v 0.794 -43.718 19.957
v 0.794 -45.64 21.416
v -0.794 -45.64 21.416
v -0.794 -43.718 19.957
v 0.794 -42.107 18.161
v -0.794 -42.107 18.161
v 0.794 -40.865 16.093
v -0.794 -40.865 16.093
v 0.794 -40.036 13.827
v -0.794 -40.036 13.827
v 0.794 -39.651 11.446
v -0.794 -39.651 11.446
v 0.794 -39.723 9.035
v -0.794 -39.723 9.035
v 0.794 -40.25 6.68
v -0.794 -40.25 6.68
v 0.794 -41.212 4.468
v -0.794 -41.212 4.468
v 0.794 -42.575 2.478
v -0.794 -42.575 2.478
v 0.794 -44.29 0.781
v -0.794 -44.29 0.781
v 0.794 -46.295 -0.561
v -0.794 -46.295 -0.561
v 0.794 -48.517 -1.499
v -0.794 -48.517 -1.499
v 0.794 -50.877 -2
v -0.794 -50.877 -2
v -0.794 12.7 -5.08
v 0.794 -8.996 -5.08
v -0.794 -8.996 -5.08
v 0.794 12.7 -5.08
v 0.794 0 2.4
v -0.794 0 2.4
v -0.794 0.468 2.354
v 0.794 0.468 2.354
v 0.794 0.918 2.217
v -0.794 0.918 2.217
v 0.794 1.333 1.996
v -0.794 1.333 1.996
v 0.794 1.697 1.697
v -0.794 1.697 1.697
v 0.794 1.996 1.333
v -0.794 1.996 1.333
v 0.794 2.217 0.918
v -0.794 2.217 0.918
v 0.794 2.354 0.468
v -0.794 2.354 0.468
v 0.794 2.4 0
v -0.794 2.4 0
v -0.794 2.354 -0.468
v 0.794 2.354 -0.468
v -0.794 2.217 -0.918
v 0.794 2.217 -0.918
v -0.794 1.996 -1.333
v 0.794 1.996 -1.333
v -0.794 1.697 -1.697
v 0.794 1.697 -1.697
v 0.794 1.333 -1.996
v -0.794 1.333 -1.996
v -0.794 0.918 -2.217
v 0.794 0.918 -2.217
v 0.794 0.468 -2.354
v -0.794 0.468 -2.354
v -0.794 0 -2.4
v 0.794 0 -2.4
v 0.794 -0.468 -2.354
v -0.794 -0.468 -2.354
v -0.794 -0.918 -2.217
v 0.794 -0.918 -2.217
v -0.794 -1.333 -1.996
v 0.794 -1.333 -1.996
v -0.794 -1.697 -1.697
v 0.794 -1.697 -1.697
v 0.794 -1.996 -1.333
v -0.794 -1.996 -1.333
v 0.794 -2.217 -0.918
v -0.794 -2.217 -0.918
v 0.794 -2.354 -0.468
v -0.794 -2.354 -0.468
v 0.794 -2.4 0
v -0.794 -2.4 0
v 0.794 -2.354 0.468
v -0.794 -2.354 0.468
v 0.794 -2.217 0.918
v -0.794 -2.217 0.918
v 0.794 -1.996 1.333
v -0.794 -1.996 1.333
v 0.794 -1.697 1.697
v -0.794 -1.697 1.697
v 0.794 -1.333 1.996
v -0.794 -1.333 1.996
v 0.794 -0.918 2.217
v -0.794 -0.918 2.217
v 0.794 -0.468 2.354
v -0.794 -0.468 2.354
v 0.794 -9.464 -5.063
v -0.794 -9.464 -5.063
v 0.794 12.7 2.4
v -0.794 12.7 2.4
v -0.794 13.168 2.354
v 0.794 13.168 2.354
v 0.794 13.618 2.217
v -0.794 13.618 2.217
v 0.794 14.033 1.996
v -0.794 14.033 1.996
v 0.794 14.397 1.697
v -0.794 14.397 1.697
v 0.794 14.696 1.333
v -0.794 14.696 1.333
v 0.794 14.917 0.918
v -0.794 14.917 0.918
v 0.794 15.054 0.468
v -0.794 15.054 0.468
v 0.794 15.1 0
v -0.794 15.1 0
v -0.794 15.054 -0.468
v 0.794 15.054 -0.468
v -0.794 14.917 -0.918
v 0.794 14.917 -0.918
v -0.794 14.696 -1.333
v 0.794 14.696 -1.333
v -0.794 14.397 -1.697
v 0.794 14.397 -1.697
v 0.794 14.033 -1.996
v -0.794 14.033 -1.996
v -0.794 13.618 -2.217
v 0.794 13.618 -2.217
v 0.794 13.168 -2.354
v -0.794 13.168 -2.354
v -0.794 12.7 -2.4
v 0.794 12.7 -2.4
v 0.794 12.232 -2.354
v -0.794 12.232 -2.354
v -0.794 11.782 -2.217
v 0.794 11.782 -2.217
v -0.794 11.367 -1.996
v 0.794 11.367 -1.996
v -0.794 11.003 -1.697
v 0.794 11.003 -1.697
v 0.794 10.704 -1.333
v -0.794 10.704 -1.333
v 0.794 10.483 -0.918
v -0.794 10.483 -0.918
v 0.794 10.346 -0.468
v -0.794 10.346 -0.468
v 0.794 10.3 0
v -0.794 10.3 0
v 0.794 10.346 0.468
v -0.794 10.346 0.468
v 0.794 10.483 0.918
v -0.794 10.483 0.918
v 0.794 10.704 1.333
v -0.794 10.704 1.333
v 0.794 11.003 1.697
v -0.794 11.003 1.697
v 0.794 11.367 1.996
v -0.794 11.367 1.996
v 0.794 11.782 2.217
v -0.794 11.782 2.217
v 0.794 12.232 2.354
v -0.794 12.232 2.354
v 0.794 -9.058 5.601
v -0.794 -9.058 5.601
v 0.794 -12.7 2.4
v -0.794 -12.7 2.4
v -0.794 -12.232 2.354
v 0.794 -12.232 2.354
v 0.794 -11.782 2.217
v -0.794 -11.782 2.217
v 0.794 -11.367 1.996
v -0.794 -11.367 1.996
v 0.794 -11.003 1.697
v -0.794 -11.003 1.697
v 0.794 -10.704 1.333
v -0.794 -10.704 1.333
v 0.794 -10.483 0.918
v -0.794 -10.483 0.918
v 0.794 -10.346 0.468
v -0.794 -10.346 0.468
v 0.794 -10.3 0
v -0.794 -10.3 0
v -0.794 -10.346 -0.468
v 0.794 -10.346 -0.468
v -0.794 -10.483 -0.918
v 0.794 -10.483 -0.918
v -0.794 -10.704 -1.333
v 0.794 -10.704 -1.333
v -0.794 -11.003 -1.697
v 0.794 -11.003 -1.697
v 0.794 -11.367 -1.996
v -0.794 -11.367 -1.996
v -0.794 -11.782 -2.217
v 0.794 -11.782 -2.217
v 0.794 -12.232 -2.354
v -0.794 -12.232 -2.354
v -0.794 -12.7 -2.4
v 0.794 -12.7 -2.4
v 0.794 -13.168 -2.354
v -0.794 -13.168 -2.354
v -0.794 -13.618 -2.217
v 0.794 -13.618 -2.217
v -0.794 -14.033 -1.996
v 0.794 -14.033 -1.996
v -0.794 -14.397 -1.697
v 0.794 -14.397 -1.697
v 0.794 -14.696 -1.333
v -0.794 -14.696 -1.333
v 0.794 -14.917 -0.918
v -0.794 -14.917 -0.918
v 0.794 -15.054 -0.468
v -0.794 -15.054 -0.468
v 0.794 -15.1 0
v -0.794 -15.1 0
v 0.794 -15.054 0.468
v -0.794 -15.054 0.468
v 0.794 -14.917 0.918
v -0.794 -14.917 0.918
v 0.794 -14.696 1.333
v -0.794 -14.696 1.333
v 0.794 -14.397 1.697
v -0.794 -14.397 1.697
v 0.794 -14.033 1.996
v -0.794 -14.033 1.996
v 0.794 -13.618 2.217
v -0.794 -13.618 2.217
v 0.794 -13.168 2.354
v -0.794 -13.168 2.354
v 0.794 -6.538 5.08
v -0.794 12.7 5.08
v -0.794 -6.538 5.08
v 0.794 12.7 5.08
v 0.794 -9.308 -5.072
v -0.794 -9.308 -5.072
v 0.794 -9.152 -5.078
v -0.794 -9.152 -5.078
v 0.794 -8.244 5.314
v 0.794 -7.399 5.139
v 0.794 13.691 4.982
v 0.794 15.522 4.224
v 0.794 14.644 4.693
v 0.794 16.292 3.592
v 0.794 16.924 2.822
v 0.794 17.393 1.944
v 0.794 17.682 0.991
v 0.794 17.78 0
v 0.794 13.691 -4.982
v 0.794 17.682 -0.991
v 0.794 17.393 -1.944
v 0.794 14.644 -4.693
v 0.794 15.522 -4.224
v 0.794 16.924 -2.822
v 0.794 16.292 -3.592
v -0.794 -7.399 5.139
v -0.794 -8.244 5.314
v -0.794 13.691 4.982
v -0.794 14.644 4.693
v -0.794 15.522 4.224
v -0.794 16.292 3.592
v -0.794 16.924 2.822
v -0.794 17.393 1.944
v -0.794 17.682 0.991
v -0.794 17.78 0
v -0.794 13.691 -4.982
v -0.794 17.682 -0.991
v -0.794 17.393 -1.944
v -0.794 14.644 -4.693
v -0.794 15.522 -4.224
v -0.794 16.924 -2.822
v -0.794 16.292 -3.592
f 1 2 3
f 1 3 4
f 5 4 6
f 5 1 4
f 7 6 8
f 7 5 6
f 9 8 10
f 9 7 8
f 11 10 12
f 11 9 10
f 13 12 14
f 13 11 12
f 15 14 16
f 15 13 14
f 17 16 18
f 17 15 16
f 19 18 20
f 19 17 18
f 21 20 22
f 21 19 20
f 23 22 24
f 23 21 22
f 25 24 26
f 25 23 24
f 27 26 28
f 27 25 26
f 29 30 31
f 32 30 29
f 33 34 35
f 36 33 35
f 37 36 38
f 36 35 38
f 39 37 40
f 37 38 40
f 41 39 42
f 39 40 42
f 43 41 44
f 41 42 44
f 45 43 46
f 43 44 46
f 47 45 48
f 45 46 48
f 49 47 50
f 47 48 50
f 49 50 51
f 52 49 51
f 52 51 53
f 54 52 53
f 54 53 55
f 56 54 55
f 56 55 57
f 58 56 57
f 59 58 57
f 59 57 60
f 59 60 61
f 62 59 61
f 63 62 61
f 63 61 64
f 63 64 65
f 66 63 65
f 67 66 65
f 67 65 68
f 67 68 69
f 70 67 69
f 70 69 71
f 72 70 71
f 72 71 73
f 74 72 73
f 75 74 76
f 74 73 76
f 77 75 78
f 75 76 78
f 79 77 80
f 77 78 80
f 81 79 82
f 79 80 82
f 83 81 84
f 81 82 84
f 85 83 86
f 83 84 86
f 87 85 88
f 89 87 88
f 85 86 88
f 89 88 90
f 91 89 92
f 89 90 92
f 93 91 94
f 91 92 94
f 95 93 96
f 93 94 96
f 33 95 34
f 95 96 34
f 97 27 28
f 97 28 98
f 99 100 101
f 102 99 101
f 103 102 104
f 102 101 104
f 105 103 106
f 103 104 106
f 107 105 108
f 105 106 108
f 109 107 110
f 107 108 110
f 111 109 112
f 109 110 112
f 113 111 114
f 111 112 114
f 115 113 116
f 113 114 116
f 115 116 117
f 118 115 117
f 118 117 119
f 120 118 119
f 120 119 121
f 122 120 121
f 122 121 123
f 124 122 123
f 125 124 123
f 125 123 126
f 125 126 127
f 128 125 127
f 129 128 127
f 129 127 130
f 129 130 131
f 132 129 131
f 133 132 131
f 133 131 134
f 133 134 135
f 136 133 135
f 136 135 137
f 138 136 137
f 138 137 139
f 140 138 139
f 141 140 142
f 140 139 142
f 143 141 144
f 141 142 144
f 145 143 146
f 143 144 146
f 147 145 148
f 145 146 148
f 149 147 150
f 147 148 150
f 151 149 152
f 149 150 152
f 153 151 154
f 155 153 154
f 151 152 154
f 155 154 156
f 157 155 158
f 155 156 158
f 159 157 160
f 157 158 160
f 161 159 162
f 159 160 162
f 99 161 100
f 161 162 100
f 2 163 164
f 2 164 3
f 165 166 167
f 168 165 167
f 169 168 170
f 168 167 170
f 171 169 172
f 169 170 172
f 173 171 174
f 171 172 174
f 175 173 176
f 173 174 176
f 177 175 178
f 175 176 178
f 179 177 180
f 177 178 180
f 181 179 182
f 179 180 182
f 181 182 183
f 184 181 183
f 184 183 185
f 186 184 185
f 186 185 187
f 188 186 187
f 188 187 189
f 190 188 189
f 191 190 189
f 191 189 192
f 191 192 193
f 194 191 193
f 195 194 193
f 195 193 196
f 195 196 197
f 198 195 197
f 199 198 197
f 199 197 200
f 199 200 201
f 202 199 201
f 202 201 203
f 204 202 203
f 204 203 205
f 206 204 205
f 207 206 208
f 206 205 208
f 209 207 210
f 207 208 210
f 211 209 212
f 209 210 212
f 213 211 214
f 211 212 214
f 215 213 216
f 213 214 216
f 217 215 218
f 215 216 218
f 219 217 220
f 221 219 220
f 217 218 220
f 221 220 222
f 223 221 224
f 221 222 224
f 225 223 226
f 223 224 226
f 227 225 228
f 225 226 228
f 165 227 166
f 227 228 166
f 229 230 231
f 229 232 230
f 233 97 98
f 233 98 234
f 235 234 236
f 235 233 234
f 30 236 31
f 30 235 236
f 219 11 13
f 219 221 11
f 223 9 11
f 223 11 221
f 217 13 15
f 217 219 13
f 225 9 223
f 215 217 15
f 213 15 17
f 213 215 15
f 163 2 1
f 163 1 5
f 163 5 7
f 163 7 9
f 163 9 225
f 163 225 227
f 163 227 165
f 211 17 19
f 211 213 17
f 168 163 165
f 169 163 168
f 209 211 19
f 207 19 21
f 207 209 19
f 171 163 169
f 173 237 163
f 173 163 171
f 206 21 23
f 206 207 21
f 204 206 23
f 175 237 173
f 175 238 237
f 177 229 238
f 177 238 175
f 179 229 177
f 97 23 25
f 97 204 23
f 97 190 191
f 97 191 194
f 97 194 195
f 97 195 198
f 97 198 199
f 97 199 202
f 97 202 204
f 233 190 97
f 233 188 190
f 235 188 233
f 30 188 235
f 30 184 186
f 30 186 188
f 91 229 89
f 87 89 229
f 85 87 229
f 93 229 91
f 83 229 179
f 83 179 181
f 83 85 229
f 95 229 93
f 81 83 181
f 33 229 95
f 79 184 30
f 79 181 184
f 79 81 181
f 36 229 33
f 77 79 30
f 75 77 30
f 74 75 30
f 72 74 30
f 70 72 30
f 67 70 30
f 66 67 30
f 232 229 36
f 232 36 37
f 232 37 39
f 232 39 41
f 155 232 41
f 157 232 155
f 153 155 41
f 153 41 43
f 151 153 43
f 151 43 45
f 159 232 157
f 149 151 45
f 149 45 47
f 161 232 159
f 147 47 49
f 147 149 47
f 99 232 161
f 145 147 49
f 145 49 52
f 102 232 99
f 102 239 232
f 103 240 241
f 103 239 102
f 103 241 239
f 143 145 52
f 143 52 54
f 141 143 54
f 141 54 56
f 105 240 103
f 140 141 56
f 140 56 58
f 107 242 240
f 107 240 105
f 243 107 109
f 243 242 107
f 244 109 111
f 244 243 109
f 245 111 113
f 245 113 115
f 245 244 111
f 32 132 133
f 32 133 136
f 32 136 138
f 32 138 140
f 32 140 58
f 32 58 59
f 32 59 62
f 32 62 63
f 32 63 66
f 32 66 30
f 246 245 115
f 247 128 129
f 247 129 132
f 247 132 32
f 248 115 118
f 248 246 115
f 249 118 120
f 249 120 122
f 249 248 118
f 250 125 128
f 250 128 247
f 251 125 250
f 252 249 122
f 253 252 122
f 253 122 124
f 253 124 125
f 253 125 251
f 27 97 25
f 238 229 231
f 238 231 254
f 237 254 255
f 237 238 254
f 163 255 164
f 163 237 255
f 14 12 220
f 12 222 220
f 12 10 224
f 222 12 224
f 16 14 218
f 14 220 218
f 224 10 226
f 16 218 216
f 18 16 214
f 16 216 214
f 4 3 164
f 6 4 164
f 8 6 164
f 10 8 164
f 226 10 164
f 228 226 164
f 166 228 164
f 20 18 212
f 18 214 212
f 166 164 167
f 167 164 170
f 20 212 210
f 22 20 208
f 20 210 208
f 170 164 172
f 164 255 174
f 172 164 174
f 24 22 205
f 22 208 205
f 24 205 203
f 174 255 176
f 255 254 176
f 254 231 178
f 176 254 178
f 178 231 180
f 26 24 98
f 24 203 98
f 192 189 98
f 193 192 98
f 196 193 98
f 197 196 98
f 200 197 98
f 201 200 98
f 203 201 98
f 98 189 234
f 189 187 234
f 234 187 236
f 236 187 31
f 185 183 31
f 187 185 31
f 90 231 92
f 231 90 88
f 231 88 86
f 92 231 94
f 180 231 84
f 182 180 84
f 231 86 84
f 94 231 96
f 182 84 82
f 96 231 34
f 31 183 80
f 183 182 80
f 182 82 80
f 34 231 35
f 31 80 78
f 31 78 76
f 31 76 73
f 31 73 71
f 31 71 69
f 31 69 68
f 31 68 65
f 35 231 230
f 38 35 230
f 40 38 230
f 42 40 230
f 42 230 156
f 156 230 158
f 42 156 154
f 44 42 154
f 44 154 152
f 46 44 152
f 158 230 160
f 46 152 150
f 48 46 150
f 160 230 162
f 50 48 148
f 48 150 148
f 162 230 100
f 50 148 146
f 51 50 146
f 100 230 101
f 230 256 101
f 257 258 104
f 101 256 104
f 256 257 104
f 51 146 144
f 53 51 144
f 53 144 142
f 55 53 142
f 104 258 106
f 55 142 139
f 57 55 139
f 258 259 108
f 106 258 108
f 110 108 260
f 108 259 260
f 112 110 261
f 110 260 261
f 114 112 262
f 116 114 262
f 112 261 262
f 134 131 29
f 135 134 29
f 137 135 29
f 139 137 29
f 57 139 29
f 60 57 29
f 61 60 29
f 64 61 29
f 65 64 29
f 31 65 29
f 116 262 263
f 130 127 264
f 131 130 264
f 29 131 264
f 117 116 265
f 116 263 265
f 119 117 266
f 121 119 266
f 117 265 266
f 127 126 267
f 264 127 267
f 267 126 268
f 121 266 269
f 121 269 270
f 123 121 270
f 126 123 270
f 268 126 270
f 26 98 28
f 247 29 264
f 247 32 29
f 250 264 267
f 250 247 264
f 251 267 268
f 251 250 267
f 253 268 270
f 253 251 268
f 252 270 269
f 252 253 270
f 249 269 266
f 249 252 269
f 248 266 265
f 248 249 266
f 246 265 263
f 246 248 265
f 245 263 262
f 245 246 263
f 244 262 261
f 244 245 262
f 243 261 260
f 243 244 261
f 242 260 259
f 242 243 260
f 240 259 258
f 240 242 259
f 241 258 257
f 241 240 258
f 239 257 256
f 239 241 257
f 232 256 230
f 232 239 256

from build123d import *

# Parameters (mm, degrees)
BOSS_EXTRUDE1_DEPTH  = 0.79375
M4_CLEARANCE_HOLE1_D = 4.8


with BuildPart() as part:
    # Sketch1 → Boss-Extrude1 (new, symmetric)
    with BuildSketch(Plane(origin=(0, 0, 0), x_dir=(0, 0, -1), z_dir=(1, 0, 0))):
        with BuildLine():
            Line((-5.08, 12.7), (-5.08, -6.538207725))
            ThreePointArc((-5.08, -6.538207725), (-5.211700121, -7.824771606), (-5.601337517, -9.057968362))
            Line((-5.601337517, -9.057968362), (-21.415741229, -45.63954689))
            ThreePointArc((-21.415741229, -45.63954689), (-7.844956242, -39.930269315), (2.000109042, -50.877266399))
            Line((2.000109042, -50.877266399), (5.062707082, -9.46401976))
            ThreePointArc((5.062707082, -9.46401976), (5.075675298, -9.230020736), (5.08, -8.995702545))
            Line((5.08, -8.995702545), (5.08, 12.7))
            ThreePointArc((5.08, 12.7), (0, 17.78), (-5.08, 12.7))
        make_face()
    extrude(amount=BOSS_EXTRUDE1_DEPTH, both=True)

    # M4 Clearance Hole1 (through all)
    with Locations(Plane(origin=(0.79375, 0, 0), x_dir=(0, 0, -1), z_dir=(1, 0, 0))):
        with Locations((0, 0), (0, 12.7), (0, -12.7)):
            Hole(M4_CLEARANCE_HOLE1_D / 2)


solid = part.part
